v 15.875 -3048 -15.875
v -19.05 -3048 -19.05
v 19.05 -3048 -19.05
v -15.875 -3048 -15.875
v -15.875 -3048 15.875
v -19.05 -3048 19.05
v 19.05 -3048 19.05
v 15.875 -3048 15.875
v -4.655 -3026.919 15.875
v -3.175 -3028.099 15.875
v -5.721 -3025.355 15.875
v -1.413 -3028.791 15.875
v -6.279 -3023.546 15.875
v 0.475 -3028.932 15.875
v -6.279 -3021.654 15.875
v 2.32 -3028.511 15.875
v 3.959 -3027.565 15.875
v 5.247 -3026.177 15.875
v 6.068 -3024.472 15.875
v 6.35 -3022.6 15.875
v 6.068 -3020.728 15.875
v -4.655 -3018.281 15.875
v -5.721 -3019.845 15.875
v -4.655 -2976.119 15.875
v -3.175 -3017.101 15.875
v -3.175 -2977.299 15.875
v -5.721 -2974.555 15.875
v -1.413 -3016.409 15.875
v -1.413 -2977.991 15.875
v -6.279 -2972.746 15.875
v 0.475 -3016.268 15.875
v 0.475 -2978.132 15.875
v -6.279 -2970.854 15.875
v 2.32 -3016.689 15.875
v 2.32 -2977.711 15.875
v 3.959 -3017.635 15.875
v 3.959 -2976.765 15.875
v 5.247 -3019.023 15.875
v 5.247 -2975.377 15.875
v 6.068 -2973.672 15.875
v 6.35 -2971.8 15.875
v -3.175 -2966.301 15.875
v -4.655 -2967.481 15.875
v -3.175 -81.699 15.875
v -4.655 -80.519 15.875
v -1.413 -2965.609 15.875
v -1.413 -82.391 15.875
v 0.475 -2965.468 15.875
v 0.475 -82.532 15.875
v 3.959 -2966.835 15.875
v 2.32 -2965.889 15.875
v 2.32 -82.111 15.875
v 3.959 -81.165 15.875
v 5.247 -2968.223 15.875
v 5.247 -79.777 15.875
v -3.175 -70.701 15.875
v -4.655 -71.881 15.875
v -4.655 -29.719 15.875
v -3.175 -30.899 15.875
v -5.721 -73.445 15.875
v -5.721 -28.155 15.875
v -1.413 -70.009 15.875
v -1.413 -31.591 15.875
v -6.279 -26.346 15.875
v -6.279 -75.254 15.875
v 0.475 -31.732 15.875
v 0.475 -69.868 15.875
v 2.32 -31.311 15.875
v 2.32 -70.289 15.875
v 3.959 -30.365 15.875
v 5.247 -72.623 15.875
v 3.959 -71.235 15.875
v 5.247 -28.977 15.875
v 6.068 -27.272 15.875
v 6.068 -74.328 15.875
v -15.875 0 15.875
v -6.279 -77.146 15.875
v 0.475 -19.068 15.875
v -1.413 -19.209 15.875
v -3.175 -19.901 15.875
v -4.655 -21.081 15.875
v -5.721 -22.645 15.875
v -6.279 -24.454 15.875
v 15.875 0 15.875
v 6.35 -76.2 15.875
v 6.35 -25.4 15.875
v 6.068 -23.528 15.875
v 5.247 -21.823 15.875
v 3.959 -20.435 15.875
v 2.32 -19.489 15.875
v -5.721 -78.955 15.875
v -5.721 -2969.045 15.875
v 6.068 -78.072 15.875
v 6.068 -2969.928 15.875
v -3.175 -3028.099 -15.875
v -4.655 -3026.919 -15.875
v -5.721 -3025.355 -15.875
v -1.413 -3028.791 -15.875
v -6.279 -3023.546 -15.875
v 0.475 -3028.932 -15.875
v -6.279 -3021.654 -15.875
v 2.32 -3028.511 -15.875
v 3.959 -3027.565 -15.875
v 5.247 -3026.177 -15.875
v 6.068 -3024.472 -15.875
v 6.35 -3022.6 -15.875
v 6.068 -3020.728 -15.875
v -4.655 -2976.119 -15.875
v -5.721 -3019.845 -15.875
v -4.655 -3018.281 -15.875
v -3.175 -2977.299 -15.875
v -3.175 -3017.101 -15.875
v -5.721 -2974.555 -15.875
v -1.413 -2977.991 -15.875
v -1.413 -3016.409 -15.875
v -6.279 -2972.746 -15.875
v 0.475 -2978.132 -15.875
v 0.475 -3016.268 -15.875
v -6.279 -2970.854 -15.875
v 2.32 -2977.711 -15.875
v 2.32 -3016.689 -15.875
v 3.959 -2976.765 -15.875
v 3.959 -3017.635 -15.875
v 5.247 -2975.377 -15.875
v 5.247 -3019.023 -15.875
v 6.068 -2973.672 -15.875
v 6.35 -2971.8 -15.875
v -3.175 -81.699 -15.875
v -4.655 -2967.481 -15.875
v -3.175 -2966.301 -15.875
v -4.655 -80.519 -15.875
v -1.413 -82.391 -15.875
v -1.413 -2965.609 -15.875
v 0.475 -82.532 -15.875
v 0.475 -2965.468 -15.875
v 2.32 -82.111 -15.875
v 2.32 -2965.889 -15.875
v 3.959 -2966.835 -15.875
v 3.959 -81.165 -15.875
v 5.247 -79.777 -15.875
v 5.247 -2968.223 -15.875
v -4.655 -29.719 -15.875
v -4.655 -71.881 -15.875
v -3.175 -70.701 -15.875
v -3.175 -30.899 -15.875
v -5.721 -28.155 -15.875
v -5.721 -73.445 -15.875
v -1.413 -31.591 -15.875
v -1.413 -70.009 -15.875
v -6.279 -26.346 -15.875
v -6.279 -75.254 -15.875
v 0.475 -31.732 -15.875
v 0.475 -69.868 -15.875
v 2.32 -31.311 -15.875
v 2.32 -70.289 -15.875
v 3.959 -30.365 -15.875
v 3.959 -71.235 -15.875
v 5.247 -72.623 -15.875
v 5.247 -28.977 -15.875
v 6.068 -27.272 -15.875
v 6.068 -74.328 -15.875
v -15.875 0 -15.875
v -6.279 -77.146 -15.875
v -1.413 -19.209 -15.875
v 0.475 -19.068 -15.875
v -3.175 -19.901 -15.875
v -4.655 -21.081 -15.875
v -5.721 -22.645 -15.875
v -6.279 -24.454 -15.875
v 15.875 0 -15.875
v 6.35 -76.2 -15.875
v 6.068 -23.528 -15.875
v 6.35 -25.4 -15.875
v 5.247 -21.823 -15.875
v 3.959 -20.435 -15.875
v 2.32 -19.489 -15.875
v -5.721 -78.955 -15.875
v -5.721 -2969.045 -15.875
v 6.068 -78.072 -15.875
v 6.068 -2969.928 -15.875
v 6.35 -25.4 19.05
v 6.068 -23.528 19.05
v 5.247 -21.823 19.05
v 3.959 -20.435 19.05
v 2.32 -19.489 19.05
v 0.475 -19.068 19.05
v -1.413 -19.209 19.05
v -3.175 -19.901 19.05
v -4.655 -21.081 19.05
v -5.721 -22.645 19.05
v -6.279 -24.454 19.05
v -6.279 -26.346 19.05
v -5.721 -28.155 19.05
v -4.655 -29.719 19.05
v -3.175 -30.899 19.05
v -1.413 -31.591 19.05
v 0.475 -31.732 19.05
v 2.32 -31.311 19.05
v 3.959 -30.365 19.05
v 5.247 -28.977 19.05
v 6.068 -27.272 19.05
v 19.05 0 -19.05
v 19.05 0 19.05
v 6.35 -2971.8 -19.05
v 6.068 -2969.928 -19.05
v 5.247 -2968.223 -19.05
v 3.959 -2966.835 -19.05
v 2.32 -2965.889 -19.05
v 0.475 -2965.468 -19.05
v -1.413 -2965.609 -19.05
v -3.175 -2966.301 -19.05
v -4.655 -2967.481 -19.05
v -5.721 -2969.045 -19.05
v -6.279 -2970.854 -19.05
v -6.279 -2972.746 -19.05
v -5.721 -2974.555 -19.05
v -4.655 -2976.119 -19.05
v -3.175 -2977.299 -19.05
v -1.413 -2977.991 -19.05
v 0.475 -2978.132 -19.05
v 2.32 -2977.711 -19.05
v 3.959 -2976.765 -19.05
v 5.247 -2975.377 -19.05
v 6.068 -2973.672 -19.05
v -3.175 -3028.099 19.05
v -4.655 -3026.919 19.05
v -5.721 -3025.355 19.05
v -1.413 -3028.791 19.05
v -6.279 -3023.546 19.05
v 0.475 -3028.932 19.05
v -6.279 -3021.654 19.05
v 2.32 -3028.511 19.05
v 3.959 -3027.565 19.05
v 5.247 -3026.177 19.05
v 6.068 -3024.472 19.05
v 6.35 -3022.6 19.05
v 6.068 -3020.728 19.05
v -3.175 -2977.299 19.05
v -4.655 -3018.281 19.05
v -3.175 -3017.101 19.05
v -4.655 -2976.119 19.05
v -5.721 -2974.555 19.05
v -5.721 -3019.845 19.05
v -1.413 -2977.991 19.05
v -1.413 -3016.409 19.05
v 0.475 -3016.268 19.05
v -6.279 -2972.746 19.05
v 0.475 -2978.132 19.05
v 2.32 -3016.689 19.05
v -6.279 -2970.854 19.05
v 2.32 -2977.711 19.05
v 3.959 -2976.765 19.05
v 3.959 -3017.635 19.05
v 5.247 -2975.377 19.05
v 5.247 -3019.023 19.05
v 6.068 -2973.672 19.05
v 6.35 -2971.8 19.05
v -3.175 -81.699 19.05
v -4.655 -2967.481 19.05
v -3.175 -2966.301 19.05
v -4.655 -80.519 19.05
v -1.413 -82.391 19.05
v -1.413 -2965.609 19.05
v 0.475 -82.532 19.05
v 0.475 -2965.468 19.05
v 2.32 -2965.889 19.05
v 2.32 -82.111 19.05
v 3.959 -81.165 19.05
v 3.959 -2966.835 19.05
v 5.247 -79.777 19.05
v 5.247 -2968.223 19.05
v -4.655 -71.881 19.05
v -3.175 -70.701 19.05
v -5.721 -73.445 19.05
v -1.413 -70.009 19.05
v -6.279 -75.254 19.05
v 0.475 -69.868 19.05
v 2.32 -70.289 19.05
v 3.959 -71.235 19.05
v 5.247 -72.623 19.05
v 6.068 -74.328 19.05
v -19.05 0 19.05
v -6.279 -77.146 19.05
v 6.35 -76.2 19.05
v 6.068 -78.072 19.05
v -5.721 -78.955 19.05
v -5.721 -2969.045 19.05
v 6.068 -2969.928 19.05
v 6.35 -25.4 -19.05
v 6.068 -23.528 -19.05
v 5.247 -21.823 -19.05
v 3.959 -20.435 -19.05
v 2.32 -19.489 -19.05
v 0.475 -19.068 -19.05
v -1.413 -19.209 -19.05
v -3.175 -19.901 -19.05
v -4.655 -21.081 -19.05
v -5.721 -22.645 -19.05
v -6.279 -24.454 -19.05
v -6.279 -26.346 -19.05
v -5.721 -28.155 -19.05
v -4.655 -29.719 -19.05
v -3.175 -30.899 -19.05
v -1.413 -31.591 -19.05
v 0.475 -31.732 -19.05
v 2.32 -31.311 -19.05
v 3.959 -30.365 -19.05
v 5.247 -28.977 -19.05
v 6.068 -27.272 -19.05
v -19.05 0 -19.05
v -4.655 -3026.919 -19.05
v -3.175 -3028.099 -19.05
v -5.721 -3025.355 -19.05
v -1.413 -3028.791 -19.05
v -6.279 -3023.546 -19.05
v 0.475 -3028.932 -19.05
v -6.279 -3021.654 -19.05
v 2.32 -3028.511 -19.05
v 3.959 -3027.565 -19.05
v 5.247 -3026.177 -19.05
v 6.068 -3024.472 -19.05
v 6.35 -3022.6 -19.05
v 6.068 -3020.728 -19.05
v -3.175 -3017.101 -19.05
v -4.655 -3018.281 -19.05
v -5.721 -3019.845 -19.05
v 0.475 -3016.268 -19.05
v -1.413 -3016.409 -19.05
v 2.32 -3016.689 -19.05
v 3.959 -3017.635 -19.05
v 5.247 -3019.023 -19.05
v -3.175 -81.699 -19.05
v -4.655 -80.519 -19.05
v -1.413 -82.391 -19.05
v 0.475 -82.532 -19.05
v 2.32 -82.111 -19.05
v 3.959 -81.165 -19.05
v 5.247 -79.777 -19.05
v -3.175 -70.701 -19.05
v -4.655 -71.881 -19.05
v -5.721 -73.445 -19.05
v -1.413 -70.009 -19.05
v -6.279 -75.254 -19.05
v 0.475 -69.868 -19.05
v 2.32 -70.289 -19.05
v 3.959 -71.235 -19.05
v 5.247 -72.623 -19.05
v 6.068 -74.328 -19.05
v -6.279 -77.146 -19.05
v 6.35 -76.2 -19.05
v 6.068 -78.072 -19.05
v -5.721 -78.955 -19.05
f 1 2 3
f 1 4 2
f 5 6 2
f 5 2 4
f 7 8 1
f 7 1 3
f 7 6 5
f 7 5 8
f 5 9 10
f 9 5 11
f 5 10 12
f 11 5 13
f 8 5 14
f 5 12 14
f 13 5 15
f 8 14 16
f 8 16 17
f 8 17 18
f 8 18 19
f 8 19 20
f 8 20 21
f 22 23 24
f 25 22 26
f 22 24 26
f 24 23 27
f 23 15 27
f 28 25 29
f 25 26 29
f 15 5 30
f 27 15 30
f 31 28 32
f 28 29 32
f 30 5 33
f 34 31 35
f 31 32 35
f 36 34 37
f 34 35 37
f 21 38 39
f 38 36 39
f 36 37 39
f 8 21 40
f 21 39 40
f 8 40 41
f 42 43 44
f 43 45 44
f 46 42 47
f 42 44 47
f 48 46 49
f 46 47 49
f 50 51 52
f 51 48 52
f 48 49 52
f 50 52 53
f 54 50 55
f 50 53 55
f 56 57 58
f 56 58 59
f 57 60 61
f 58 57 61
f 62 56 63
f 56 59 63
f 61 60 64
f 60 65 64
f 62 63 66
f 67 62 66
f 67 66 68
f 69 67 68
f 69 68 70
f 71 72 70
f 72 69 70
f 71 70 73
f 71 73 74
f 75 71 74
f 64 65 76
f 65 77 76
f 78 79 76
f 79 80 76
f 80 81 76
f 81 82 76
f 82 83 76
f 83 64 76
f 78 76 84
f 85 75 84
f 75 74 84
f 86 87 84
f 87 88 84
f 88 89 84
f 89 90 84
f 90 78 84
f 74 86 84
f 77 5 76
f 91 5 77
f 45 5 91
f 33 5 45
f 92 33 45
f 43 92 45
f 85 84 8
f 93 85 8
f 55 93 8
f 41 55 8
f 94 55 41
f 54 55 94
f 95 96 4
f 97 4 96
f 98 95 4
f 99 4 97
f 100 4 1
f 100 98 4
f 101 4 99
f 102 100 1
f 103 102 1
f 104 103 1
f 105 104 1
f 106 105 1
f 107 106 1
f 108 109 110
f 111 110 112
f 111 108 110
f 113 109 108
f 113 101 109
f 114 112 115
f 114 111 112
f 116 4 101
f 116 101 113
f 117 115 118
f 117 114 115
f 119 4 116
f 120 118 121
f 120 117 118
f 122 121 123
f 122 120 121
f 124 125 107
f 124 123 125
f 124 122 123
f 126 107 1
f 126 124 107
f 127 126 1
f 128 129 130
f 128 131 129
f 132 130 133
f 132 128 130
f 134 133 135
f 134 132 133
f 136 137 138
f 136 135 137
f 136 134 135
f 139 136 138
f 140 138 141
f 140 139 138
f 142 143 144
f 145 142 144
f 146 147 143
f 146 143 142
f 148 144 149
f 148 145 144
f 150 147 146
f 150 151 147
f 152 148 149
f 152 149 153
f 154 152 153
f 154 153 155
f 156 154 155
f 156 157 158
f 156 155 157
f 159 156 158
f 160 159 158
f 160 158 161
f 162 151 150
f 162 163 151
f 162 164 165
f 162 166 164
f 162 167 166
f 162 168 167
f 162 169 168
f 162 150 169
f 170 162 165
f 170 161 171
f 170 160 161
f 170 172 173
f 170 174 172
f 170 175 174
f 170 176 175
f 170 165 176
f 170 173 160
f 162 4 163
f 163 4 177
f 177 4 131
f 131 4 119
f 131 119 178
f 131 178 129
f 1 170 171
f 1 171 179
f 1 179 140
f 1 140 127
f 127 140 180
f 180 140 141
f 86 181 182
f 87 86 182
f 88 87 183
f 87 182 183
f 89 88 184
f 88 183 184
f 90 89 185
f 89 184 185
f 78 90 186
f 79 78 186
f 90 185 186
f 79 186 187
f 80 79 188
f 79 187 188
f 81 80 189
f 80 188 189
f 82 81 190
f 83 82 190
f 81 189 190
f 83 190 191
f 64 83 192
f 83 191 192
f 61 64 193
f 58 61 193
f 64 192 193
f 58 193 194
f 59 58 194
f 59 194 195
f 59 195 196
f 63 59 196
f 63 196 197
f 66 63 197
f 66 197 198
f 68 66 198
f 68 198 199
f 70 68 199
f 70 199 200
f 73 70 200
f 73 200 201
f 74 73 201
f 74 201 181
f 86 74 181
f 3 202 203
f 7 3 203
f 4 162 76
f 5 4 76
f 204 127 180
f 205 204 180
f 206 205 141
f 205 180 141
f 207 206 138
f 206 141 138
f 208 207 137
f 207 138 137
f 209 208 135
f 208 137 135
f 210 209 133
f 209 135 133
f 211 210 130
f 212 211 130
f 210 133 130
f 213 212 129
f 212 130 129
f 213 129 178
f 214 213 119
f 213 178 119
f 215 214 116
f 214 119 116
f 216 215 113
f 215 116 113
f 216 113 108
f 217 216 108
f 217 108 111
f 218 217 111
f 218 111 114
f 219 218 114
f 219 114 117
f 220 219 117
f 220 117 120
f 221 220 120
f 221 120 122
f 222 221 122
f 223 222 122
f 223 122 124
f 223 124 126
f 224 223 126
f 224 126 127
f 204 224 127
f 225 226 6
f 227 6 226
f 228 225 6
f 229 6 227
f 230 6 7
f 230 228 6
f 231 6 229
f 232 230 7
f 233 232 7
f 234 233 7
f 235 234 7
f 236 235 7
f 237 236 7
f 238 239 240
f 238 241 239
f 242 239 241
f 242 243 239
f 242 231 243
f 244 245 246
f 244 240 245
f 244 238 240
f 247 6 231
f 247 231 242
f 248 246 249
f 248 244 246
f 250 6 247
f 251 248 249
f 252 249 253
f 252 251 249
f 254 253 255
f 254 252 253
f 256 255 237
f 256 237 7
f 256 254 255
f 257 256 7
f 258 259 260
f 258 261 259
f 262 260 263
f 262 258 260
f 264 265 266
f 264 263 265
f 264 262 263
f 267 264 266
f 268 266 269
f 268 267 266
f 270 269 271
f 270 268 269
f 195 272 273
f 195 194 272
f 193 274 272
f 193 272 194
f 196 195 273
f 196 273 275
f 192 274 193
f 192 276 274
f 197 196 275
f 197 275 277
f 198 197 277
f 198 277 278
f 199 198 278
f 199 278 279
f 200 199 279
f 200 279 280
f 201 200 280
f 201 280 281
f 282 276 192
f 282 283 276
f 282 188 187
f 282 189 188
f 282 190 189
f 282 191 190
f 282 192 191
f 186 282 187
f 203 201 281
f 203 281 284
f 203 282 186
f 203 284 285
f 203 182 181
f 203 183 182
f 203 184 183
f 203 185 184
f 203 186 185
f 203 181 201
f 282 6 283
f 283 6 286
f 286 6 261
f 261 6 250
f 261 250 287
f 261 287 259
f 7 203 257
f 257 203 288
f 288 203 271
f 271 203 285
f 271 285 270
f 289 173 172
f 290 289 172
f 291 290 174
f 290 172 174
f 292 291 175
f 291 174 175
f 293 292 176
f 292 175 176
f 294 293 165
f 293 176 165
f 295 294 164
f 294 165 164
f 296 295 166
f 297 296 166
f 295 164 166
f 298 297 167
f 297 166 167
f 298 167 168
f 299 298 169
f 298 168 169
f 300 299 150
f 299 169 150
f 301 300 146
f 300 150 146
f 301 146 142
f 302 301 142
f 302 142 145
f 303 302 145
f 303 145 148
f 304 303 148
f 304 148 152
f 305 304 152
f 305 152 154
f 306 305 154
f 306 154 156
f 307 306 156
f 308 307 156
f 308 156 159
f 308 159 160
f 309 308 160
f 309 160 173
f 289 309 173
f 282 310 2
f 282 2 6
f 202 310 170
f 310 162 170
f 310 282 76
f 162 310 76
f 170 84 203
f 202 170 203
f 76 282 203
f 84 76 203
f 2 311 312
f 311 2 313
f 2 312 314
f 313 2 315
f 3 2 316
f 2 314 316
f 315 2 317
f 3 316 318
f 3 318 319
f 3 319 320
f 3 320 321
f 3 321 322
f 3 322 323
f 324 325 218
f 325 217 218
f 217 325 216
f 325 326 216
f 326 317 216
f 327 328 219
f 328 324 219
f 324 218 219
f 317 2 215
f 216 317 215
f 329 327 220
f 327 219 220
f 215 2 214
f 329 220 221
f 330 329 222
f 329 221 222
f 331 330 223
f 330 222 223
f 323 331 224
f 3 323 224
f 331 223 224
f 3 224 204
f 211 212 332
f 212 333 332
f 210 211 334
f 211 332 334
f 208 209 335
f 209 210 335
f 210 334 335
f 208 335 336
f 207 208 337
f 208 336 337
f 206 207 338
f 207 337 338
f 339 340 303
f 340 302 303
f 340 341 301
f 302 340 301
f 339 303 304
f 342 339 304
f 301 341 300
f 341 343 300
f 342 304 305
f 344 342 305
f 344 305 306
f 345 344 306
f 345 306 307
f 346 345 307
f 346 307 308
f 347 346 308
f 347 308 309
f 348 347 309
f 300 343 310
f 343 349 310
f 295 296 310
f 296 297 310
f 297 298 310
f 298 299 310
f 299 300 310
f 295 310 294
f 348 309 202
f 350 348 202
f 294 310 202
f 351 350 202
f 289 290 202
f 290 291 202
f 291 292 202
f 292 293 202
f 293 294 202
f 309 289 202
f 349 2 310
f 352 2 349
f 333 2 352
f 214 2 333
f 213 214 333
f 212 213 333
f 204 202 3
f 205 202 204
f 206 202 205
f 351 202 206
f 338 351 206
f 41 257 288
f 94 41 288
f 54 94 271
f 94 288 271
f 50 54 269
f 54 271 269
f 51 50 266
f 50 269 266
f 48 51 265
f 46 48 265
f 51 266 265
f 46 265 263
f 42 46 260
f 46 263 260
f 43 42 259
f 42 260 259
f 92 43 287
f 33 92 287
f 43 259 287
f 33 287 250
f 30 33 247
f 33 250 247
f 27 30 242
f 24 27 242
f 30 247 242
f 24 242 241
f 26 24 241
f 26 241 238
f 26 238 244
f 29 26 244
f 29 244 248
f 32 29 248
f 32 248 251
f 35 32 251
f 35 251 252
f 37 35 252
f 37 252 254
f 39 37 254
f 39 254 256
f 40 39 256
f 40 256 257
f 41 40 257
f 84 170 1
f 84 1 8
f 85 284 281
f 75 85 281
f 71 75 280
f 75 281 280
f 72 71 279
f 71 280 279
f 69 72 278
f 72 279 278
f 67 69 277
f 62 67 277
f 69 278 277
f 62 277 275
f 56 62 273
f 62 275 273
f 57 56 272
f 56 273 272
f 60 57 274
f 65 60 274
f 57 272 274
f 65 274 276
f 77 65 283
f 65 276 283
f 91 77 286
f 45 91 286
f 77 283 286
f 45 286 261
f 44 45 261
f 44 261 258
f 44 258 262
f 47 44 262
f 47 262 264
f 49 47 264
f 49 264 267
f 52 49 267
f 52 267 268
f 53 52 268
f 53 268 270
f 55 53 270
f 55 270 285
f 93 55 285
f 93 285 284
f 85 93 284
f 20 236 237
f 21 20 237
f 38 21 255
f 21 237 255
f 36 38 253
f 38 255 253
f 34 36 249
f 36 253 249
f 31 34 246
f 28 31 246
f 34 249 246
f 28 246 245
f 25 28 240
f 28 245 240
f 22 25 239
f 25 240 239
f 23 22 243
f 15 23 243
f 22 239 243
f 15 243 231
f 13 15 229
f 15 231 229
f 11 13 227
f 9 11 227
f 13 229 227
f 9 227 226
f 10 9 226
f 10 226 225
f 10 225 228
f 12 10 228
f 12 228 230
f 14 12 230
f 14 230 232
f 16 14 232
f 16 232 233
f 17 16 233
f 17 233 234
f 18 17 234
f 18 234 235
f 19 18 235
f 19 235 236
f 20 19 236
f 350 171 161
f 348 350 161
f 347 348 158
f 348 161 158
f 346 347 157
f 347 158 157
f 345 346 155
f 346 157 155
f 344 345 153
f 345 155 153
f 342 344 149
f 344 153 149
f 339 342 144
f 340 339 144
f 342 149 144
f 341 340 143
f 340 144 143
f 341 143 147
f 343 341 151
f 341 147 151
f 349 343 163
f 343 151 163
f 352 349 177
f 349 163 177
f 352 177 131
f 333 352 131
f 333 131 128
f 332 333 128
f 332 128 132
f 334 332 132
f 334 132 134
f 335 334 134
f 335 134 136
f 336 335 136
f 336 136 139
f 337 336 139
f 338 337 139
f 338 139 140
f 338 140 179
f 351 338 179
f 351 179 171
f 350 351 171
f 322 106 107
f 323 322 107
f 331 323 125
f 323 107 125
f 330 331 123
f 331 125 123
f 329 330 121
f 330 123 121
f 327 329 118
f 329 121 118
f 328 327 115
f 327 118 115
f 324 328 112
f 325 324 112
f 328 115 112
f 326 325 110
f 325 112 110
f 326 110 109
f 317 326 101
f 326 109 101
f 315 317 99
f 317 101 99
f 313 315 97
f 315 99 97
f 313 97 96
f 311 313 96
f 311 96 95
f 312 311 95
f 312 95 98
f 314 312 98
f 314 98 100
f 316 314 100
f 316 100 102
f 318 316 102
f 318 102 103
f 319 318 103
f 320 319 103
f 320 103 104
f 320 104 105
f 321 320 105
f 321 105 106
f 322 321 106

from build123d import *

# Parameters (mm, degrees)
F0_W     = 38.1
F0_H     = 38.1
F0_W_2   = 31.75
F0_H_2   = 31.75
F1_DEPTH = 3048
F2_R     = 6.35
F3_DEPTH = 38.101


# Not quite as in the source:
# - a feature names something its author has since deleted; it is built from what else it names


with BuildPart() as f1:
    # F0 (on Front) → F1 (new body)
    with BuildSketch(Plane.XZ):
        Rectangle(F0_W, F0_H)
        Rectangle(F0_W_2, F0_H_2, mode=Mode.SUBTRACT)
    extrude(amount=F1_DEPTH)

    # F2 (on face) → F3 (cut, through all)
    with BuildSketch(Plane.XY.offset(19.05)):
        with Locations((0, -25.4)):
            Circle(F2_R)
        with Locations((0, -76.2)):
            Circle(F2_R)
        with Locations((0, -3022.6)):
            Circle(F2_R)
        with Locations((0, -2971.8)):
            Circle(F2_R)
    extrude(amount=-F3_DEPTH, mode=Mode.SUBTRACT)


solid = f1.part
